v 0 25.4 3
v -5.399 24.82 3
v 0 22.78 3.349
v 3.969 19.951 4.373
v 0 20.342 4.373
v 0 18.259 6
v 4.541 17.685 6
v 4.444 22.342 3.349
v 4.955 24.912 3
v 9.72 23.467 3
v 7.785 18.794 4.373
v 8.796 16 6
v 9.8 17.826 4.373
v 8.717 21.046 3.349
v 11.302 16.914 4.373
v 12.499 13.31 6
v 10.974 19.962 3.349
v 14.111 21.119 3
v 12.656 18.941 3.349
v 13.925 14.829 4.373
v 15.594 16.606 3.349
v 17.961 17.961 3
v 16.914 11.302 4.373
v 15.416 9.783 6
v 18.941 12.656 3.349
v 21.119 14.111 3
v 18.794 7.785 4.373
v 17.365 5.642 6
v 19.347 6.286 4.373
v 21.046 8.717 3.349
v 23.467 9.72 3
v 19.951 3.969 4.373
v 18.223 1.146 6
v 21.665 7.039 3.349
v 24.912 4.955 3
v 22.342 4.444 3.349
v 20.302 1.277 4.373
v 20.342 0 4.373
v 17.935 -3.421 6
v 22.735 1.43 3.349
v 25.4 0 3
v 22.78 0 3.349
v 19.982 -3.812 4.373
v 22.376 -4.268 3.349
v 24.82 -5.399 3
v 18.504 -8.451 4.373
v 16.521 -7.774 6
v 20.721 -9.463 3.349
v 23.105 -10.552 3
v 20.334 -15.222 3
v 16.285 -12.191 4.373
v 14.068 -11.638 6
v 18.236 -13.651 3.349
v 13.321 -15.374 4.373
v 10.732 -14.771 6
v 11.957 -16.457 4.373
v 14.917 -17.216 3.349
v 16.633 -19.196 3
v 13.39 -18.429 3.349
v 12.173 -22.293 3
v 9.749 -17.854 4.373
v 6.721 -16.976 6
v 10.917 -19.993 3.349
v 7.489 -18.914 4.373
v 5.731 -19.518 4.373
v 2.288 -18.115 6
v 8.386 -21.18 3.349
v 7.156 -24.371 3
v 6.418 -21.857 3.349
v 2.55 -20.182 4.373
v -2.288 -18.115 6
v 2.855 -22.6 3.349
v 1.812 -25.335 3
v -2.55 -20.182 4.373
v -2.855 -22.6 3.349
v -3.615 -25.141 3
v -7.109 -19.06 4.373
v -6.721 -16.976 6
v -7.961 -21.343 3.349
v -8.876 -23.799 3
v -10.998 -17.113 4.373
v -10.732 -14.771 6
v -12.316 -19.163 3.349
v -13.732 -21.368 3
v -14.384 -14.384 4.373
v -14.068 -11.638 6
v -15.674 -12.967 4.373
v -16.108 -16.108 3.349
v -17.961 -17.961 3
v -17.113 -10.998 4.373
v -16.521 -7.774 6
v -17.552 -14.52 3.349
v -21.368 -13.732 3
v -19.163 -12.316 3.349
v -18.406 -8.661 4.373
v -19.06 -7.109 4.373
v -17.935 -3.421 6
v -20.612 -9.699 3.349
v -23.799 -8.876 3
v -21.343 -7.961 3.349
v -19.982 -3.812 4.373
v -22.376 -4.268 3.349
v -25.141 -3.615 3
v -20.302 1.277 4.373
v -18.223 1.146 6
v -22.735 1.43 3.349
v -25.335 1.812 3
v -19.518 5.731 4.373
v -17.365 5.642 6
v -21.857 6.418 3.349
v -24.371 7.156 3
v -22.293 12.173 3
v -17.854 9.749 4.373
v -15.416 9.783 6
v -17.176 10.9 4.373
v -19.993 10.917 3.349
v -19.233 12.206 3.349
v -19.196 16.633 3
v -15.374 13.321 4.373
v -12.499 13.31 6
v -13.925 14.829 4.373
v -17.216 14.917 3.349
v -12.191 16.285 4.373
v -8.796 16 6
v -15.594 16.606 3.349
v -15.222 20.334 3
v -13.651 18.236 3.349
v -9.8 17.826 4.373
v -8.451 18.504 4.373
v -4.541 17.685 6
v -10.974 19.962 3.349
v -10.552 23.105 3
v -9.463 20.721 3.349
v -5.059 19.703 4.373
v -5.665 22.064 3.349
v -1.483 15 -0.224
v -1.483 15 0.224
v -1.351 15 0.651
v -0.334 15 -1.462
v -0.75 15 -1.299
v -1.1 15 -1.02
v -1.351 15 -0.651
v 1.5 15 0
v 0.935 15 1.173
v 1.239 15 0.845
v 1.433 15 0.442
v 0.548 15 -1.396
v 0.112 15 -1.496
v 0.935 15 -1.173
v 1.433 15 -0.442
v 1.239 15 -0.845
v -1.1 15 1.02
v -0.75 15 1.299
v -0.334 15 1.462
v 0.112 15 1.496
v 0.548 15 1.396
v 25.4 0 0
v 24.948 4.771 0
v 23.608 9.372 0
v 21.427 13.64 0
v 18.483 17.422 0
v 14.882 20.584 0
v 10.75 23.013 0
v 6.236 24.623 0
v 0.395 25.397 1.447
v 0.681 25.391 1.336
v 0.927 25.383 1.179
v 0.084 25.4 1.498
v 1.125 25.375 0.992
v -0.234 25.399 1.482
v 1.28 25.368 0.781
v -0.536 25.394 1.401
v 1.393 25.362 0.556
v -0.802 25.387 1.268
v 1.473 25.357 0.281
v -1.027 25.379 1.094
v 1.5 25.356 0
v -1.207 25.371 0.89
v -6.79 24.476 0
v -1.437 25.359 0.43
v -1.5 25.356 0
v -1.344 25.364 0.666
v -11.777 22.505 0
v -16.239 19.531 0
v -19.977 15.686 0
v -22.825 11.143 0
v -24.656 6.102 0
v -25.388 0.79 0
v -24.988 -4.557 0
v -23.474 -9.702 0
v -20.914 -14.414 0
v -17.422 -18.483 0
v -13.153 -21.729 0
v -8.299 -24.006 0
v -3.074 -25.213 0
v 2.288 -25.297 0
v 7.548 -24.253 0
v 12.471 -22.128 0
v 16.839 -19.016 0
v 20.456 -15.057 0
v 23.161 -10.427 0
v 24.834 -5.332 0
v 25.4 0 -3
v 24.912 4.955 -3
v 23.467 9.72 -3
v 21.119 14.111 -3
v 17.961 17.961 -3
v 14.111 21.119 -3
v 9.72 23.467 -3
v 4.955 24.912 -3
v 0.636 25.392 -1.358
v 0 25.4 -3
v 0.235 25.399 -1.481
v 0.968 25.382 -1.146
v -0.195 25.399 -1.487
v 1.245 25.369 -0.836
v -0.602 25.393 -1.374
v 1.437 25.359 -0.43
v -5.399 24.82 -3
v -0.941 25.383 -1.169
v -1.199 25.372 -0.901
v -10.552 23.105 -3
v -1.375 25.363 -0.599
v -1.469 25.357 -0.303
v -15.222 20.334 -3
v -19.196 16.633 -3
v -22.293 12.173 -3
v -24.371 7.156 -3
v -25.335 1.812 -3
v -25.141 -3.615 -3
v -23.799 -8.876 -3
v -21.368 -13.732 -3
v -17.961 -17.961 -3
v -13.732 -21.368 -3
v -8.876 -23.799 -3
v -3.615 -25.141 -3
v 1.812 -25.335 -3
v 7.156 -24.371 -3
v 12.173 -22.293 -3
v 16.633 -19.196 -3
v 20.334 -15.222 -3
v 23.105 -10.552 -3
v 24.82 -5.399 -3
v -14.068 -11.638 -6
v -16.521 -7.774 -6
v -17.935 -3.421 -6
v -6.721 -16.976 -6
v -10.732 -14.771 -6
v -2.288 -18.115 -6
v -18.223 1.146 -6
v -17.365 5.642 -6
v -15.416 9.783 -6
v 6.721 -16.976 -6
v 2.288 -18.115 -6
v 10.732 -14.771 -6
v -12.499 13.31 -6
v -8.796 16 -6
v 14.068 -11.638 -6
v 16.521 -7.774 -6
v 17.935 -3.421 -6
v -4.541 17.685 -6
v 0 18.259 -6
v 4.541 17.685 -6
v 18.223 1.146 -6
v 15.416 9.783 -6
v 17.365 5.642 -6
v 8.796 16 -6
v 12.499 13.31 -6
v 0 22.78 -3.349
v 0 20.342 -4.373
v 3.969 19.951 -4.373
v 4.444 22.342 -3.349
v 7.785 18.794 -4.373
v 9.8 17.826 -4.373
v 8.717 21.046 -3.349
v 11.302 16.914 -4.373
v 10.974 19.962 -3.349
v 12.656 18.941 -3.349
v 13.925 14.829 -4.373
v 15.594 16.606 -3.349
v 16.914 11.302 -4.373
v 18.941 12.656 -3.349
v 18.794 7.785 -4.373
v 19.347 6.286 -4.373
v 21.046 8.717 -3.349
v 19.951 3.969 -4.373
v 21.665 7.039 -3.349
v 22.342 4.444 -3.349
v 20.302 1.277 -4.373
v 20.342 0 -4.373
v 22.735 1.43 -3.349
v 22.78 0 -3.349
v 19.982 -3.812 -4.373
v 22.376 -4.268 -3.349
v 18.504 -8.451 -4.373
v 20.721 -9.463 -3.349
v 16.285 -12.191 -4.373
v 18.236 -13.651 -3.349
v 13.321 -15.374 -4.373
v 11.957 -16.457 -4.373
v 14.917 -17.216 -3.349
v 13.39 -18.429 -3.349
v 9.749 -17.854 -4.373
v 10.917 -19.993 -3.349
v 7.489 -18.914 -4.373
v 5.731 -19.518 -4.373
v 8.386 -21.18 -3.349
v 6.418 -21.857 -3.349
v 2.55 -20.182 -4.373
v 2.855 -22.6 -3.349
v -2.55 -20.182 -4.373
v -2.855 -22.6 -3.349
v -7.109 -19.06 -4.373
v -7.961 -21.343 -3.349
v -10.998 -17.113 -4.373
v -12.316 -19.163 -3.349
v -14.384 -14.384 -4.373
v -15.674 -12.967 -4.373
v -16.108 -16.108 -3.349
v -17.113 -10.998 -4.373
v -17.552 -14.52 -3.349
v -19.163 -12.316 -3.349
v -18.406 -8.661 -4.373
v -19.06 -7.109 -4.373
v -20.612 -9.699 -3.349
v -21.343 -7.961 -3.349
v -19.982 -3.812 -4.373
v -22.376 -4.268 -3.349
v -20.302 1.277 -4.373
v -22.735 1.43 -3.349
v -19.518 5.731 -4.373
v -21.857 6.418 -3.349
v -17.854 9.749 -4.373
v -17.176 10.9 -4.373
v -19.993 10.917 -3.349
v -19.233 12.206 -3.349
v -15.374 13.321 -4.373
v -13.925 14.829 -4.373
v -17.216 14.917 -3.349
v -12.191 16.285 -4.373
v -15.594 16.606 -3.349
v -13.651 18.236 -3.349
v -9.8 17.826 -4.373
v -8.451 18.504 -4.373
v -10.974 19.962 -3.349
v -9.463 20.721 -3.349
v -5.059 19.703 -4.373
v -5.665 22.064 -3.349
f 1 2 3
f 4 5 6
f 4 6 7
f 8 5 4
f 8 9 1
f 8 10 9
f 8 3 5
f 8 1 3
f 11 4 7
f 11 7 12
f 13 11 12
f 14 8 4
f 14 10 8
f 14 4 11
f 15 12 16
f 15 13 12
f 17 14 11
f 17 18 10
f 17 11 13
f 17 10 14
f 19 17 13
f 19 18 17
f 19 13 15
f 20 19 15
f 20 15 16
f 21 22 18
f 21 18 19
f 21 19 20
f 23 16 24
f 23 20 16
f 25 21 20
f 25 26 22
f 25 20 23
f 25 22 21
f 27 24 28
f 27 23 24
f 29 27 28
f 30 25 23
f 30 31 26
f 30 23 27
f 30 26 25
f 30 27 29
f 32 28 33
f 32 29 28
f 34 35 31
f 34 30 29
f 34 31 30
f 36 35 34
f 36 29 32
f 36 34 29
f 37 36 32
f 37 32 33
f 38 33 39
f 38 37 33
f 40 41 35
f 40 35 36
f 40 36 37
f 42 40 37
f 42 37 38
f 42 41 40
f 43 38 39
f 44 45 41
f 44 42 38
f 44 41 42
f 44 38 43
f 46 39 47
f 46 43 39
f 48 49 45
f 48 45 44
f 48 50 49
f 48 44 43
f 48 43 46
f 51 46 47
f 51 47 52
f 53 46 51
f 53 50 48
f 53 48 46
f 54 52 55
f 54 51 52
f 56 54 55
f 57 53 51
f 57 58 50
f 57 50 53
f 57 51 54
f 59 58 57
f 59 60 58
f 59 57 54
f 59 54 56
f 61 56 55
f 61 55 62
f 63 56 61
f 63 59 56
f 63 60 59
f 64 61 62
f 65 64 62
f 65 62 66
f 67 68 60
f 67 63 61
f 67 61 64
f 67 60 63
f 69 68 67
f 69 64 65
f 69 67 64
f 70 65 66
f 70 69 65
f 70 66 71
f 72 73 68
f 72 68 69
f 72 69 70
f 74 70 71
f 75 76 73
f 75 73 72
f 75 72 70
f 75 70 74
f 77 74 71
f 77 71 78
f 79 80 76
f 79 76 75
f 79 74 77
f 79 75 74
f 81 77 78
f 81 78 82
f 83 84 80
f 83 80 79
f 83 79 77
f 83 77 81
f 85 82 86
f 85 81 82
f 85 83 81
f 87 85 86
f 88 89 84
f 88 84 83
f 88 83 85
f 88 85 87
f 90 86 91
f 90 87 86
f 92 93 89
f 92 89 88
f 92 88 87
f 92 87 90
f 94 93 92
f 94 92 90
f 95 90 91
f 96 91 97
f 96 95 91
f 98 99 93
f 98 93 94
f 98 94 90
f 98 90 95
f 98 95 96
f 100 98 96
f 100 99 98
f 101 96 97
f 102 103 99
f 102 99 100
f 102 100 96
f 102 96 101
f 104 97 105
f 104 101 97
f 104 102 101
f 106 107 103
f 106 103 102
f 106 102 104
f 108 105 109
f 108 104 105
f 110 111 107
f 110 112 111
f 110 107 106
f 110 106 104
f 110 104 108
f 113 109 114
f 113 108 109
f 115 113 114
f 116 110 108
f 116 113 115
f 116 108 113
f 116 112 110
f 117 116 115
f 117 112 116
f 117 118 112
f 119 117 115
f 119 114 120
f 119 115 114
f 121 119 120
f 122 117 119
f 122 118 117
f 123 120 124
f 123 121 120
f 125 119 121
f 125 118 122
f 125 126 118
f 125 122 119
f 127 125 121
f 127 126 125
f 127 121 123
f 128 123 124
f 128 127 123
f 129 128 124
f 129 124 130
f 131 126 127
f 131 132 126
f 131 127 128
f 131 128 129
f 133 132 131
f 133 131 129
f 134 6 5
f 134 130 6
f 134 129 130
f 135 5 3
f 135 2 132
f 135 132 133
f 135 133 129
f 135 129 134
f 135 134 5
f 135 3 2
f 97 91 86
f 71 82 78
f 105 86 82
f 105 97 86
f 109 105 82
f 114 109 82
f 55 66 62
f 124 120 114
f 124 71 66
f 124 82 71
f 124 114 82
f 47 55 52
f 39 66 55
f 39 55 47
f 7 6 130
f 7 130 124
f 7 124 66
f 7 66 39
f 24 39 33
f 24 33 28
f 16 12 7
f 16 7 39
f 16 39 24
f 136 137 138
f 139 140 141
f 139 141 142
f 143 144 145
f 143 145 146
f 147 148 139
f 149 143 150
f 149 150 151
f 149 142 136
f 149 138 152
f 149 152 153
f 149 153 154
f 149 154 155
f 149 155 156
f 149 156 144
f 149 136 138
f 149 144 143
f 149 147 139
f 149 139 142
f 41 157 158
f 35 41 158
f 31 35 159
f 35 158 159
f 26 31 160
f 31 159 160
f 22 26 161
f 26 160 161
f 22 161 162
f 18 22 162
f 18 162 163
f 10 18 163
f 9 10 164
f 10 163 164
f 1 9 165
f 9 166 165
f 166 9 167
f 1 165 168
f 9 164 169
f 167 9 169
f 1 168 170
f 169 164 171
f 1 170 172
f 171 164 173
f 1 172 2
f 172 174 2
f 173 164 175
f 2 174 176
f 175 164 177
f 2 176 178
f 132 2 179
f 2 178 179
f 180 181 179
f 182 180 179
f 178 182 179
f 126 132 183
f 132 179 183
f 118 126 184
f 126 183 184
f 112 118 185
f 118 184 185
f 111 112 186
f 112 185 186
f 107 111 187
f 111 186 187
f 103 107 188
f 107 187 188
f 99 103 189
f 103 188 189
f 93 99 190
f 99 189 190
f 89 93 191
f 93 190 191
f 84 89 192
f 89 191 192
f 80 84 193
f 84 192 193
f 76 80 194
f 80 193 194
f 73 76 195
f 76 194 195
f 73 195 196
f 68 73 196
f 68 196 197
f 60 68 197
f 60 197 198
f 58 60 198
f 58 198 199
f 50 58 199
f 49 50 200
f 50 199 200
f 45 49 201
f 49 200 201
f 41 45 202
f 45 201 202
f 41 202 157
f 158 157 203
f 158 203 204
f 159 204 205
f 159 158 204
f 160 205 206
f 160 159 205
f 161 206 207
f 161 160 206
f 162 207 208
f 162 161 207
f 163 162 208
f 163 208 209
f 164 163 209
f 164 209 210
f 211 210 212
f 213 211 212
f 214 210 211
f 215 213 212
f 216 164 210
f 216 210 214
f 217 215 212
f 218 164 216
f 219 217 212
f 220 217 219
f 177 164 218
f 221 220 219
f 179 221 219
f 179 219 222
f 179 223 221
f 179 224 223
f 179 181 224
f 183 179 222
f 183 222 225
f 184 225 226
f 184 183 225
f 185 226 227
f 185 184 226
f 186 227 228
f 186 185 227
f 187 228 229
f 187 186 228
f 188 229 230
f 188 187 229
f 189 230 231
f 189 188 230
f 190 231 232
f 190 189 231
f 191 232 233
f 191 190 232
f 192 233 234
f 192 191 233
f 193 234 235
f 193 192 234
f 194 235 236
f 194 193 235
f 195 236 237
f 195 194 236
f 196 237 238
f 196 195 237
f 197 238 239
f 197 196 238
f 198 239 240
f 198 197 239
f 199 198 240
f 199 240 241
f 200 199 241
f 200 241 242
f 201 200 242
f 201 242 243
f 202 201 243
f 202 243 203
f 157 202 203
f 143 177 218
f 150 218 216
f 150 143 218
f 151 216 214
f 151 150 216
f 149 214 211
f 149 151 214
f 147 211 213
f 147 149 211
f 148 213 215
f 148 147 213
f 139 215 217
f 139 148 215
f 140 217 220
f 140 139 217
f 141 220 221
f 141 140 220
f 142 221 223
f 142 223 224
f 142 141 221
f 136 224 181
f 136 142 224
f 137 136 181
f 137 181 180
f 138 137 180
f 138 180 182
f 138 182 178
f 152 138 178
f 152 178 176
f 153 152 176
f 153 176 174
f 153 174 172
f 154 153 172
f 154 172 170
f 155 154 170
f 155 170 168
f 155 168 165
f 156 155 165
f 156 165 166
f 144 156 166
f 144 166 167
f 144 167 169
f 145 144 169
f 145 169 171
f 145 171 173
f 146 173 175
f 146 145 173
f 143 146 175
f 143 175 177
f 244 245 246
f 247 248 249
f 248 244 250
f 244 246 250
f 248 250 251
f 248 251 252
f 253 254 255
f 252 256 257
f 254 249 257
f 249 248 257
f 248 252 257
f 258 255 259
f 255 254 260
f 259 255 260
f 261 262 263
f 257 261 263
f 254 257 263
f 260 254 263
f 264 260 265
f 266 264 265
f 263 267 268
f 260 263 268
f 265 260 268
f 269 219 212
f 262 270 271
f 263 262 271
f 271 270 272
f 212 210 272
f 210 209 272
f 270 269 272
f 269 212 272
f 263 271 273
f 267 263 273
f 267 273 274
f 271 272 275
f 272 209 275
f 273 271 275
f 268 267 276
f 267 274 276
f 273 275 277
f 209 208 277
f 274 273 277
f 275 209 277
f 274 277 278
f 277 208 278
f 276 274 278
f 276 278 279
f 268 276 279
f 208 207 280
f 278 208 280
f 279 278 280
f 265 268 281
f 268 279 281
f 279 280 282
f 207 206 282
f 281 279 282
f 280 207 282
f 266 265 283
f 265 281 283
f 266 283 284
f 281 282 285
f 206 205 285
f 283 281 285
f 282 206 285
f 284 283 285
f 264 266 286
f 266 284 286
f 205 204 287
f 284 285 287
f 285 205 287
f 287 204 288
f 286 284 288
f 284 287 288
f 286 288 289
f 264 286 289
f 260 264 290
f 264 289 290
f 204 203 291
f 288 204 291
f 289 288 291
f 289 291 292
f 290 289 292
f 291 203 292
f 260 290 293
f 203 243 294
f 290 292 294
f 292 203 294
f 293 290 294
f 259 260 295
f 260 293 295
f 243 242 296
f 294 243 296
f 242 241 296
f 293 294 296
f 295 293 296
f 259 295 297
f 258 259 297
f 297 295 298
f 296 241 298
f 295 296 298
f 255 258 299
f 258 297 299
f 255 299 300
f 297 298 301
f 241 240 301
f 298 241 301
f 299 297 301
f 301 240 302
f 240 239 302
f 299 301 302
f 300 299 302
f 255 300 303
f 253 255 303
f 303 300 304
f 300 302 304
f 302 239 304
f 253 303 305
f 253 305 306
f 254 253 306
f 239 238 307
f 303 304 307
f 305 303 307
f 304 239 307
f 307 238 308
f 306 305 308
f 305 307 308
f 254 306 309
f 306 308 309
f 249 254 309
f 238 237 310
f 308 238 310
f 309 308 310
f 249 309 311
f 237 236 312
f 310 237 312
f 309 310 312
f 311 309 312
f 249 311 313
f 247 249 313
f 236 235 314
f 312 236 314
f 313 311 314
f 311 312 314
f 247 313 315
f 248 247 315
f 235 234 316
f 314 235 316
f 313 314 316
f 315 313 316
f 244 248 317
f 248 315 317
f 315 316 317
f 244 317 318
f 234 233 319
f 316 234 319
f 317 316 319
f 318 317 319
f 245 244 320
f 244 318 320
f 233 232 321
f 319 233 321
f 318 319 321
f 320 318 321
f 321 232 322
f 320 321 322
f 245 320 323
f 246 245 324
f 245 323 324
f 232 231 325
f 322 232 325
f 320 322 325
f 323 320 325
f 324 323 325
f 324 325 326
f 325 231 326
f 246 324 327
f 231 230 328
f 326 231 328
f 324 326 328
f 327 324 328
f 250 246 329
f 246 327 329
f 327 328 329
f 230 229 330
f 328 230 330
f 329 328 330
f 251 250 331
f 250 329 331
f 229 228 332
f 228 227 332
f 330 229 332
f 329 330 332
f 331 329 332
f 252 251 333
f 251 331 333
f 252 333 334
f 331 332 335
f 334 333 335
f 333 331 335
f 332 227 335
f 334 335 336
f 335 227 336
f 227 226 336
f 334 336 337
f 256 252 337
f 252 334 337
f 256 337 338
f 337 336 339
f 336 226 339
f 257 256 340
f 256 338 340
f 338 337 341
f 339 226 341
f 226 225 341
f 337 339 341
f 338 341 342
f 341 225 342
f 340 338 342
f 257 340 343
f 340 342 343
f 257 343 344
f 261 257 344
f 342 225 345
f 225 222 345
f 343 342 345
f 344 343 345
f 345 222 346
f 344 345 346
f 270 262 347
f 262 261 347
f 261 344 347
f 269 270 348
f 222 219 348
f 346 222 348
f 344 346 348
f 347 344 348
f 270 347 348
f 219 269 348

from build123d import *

# Parameters (mm, degrees)
SKETCH1_R           = 25.4
BOSS_EXTRUDE1_DEPTH = 6
SKETCH2_R           = 10
SKETCH3_R           = 1.5
CUT_EXTRUDE1_DEPTH  = 11.4


with BuildPart() as part:
    # Sketch1 → Boss-Extrude1 (new body)
    with BuildSketch(Plane.XY):
        Circle(SKETCH1_R)
    extrude(amount=BOSS_EXTRUDE1_DEPTH)

    # Sketch2 → Cut-Revolve1 (revolve, cut)
    with BuildSketch(Plane(origin=(0, 0, 0), x_dir=(0, 0, -1), z_dir=(1, 0, 0))):
        with Locations((-13, 25.4)):
            Circle(SKETCH2_R)
    revolve(axis=Axis((0, 0, 6), (0, 0, -1)), mode=Mode.SUBTRACT)

    # Mirror1: part across plane


with BuildPart() as part_1:
    add(part.part)
    add(part.part.mirror(Plane.XY))

    # Sketch3 → Cut-Extrude1 (cut, through all)
    with BuildSketch(Plane(origin=(0, 15, 0), x_dir=(1, 0, 0), z_dir=(0, 1, 0))):
        Circle(SKETCH3_R)
    extrude(amount=CUT_EXTRUDE1_DEPTH, mode=Mode.SUBTRACT)


solid = part_1.part
